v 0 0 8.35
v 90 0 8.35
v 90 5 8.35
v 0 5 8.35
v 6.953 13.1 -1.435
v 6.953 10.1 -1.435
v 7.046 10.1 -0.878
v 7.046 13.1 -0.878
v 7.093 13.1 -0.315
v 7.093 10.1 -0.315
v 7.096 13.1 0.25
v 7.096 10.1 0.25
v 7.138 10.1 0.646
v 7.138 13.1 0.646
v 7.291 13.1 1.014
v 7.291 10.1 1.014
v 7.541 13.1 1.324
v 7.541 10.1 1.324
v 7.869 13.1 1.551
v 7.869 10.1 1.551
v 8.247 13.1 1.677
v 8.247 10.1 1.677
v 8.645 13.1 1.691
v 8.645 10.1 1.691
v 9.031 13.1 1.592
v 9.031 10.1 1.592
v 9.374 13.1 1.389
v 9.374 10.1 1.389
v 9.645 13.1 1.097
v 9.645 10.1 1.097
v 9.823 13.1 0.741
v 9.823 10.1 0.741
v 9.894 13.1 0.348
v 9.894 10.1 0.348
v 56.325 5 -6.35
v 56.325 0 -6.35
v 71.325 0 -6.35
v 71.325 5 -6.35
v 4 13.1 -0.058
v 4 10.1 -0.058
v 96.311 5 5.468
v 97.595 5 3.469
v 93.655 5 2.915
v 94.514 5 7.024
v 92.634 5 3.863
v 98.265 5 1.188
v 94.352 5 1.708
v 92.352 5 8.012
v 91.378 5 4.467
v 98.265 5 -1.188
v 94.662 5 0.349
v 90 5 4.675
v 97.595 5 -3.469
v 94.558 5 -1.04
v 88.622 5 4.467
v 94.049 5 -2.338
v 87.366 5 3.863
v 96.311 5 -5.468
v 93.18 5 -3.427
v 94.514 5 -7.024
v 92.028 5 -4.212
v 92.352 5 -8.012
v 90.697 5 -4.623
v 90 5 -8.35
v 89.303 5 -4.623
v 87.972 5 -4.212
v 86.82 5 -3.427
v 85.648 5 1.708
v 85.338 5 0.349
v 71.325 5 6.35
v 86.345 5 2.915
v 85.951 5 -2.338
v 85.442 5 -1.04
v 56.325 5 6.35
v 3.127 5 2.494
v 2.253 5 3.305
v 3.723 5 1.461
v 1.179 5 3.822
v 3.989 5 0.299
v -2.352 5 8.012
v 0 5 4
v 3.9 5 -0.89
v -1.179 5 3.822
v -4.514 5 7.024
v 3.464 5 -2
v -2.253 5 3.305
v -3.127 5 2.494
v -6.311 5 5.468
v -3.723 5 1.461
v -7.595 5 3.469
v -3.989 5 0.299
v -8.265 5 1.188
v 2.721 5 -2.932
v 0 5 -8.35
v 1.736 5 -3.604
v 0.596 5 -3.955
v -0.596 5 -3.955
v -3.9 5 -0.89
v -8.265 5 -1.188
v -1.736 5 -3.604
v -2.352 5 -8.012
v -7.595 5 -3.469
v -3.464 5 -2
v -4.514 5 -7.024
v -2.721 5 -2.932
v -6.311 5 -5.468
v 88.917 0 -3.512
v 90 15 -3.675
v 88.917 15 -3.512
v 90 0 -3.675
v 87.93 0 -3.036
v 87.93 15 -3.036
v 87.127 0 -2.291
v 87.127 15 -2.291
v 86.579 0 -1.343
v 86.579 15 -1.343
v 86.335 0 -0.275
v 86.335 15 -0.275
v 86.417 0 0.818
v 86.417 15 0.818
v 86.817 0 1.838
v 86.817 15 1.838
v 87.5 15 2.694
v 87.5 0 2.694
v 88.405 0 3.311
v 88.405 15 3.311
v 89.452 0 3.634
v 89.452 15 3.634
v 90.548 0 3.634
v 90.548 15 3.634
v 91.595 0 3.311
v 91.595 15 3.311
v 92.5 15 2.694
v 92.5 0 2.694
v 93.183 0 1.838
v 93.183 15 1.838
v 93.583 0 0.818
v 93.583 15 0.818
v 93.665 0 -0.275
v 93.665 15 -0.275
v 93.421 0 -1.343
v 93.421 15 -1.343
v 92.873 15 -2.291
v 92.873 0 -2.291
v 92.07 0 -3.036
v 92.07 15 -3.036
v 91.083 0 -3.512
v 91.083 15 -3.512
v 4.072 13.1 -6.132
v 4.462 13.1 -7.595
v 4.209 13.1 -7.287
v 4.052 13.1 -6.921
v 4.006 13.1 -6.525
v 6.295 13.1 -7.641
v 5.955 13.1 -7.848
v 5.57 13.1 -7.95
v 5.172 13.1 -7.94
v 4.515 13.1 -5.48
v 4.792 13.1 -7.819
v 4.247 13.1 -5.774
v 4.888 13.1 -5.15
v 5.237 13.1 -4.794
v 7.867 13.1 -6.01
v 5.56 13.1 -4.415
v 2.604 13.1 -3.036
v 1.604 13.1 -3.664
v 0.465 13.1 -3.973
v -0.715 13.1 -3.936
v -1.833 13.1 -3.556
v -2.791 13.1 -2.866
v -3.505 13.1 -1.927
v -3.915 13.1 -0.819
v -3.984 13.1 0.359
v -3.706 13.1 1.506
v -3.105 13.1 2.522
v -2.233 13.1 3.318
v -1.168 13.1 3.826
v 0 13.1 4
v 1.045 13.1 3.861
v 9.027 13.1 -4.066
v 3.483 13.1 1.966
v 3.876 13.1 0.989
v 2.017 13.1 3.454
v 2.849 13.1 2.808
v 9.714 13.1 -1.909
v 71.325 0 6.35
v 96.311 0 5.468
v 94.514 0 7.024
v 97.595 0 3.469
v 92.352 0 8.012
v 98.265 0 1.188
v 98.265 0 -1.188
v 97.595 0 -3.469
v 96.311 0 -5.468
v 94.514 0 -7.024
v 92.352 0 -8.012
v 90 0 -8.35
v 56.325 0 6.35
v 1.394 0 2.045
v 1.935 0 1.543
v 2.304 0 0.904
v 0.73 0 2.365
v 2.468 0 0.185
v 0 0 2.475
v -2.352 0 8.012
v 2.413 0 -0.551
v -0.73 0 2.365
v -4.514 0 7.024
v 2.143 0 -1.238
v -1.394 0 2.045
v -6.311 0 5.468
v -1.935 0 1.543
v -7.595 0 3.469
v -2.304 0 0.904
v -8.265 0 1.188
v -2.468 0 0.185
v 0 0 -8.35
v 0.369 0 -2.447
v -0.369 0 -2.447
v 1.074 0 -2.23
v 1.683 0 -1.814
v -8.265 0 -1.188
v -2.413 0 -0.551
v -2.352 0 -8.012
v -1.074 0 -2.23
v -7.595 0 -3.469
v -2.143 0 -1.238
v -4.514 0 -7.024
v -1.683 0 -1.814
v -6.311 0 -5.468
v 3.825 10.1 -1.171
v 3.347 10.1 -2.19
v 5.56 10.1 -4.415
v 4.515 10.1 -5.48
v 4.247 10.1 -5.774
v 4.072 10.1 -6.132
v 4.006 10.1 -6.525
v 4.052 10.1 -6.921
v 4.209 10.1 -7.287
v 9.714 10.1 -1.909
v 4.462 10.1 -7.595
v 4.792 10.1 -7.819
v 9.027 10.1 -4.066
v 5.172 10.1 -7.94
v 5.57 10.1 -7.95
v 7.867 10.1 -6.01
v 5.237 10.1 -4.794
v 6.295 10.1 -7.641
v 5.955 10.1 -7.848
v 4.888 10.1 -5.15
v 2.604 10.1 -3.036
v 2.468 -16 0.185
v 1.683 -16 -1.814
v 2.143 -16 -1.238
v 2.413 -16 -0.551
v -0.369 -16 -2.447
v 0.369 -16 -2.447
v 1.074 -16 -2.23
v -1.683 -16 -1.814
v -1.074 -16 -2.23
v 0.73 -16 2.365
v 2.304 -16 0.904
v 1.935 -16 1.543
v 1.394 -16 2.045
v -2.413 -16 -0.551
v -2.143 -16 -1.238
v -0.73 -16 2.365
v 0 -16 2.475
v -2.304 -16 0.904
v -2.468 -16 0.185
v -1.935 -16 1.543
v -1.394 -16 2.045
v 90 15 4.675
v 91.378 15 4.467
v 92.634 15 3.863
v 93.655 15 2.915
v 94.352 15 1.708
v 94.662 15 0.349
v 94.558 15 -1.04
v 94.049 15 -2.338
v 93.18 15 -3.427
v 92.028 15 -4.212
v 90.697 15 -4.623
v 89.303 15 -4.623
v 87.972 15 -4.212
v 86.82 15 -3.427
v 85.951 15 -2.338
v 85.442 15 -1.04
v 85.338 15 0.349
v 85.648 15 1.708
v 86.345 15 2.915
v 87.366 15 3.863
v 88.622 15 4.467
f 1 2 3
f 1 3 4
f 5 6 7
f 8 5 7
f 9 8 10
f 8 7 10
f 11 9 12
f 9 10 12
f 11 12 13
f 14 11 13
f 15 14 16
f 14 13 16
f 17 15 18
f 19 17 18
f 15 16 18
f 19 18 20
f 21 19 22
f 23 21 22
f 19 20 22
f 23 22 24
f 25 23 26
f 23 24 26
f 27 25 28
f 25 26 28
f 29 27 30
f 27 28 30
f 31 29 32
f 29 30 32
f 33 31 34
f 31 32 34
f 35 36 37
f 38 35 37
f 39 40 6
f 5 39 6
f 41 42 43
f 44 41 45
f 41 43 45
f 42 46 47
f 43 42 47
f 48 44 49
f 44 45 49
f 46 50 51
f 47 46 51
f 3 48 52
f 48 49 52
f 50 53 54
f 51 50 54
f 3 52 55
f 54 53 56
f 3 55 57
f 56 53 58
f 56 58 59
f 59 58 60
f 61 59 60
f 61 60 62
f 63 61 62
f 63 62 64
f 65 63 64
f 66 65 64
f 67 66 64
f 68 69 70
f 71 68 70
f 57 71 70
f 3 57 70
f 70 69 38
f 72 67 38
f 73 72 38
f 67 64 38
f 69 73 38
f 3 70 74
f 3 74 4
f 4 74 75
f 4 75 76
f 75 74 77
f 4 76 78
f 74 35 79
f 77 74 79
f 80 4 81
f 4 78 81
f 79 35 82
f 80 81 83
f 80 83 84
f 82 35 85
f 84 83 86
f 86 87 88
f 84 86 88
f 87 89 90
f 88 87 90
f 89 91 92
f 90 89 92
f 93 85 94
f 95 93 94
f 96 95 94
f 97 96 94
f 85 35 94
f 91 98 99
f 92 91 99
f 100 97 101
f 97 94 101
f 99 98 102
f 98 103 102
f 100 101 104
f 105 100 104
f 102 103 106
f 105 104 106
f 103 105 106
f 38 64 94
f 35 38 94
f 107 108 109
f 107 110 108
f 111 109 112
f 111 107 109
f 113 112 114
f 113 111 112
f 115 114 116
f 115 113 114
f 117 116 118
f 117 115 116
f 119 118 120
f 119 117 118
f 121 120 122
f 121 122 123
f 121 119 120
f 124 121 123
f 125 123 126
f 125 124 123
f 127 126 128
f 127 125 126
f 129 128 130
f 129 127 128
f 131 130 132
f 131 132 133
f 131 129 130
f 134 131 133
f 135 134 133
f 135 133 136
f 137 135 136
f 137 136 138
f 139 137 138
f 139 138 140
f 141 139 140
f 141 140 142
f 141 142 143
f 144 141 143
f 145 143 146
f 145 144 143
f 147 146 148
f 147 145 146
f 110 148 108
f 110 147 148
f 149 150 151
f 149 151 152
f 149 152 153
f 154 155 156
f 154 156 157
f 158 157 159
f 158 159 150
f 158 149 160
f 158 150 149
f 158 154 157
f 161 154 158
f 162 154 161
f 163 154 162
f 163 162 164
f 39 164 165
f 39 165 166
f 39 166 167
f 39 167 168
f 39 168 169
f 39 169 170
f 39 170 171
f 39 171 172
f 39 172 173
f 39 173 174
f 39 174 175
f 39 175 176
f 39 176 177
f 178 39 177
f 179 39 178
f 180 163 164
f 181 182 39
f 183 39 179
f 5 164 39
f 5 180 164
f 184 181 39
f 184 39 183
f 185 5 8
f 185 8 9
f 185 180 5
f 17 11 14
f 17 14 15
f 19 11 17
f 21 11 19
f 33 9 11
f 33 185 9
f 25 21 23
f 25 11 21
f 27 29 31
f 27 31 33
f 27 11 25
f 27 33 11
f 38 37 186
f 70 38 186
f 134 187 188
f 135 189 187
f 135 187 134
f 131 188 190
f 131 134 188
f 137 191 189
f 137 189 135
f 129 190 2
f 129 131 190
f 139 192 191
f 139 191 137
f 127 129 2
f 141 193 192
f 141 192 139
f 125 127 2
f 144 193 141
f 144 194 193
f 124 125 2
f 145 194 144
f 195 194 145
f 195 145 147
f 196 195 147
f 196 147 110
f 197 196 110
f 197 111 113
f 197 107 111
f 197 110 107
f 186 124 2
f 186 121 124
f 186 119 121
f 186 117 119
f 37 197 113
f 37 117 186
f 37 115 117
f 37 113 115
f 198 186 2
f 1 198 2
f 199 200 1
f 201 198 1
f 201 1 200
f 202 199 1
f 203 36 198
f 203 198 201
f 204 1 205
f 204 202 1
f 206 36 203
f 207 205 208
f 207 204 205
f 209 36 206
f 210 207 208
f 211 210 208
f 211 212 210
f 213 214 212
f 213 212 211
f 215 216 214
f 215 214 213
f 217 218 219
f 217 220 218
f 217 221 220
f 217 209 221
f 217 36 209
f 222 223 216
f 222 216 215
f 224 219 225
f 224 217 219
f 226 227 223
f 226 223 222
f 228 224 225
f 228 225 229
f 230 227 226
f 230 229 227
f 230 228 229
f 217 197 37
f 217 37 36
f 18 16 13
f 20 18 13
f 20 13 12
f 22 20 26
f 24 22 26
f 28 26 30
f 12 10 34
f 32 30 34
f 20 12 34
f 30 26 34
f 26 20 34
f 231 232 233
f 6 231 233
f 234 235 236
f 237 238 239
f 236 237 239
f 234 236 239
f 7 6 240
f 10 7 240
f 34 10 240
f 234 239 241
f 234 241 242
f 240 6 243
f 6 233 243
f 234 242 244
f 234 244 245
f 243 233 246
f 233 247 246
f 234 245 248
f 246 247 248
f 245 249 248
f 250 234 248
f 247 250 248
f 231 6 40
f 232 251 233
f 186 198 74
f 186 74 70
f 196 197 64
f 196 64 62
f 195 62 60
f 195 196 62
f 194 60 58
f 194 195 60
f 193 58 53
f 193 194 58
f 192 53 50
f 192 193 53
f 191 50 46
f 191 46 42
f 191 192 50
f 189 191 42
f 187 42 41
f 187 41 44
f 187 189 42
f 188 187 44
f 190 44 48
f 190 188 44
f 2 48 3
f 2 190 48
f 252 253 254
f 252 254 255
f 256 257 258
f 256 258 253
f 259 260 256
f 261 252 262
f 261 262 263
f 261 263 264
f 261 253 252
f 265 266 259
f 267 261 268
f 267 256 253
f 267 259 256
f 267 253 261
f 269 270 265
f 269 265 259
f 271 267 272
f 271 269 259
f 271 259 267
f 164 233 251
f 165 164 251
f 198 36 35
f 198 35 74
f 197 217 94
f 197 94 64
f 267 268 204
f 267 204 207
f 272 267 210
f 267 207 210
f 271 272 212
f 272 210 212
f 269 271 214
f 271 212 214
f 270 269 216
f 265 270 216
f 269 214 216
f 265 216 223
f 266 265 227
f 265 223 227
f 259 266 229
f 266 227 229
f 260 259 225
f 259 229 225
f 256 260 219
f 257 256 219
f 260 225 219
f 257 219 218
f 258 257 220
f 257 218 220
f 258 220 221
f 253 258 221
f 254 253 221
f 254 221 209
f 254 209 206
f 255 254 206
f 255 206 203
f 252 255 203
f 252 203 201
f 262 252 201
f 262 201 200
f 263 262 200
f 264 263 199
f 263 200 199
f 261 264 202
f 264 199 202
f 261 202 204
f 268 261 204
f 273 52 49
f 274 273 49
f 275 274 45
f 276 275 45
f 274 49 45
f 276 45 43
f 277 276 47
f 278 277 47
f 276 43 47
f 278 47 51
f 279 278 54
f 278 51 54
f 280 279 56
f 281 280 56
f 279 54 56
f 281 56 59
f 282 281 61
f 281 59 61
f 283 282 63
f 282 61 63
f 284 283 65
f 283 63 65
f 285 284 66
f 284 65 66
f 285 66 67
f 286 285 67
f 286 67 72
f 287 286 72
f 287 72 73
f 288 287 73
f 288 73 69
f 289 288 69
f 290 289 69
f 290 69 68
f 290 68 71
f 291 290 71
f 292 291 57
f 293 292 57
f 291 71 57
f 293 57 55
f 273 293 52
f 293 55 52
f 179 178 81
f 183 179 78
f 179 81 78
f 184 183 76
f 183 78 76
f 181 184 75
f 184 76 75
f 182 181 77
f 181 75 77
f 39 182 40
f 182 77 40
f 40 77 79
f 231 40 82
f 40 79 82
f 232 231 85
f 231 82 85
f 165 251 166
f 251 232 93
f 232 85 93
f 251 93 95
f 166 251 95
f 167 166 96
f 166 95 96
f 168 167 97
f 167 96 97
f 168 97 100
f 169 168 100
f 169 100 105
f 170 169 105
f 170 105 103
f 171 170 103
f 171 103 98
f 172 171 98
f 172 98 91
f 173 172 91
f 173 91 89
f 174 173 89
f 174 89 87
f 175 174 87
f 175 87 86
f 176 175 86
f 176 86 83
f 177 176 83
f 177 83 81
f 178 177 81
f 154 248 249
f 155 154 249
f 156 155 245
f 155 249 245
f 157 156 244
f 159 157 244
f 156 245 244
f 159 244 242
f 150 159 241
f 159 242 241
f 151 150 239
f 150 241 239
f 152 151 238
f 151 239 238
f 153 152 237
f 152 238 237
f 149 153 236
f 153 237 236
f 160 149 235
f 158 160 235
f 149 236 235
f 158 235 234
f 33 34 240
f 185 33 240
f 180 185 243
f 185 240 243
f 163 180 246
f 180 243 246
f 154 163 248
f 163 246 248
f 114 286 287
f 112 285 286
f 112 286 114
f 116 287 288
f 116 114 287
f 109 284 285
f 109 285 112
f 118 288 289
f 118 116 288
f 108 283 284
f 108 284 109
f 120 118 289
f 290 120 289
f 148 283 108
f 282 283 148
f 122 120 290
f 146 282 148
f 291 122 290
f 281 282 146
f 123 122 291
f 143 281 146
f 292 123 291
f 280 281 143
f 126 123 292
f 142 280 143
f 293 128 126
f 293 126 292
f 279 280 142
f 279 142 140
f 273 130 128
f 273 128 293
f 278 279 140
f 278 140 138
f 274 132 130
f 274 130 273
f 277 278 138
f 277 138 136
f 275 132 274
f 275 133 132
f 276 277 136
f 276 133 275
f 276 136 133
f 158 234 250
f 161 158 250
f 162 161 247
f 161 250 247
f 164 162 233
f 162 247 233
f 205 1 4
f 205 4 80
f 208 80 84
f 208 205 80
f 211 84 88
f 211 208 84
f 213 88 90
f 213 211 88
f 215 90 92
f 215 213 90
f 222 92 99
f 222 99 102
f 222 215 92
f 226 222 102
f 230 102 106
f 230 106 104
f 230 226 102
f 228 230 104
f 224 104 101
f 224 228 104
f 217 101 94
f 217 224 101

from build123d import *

# Parameters (mm, degrees)
CORPS_DEPTH             = 5
ESQUISSE1_R             = 2.475
PULLEY_HOLD_DEPTH       = 16
ESQUISSE2_R             = 4
KNOB_HOLD_DEPTH         = 8.1
KNOB_START              = 5.1
KNOB_DEPTH              = 3
ESQUISSE3_R             = 3.675
ESQUISSE3_W             = 15
ESQUISSE3_H             = 12.7
ENL_V_MAT_EXTRU_1_DEPTH = 100.992224698
ESQUISSE5_R             = 4.675
ESQUISSE5_R_2           = 3.675
BOSS_EXTRU_1_DEPTH      = 10


with BuildPart() as part:
    # Sketch1 → corps (new body)
    with BuildSketch(Plane(origin=(0, 0, 0), x_dir=(1, 0, 0), z_dir=(0, 1, 0))):
        with BuildLine():
            Line((0, 8.35), (90, 8.35))
            ThreePointArc((90, 8.35), (98.35, 0), (90, -8.35))
            Line((90, -8.35), (0, -8.35))
            ThreePointArc((0, -8.35), (-8.35, 0), (0, 8.35))
        make_face()
    extrude(amount=CORPS_DEPTH)

    # Esquisse1 → pulley hold (add)
    with BuildSketch(Plane.XZ):
        with Locations(Location((0, 0, 0), (0, 0, 90))):
            Circle(ESQUISSE1_R)
    extrude(amount=PULLEY_HOLD_DEPTH)

    # Esquisse2 → knob hold (add)
    with BuildSketch(Plane(origin=(0, 5, 0), x_dir=(1, 0, 0), z_dir=(0, 1, 0))):
        with Locations(Location((0, 0, 0), (0, 0, 270))):
            Circle(ESQUISSE2_R)
    extrude(amount=KNOB_HOLD_DEPTH)

    # Esquisse4 → knob (add)
    with BuildSketch(Plane(origin=(0, 5, 0), x_dir=(1, 0, 0), z_dir=(0, 1, 0)).offset(KNOB_START)):
        with BuildLine():
            Line((3.999579917, 0.057969697), (6.953398299, 1.435357829))
            ThreePointArc((6.953398299, 1.435357829), (7.074856515, 0.596996899), (7.095602071, -0.249862457))
            ThreePointArc((7.095602071, -0.249862457), (8.44546622, -1.698263913), (9.893867677, -0.348399764))
            ThreePointArc((9.893867677, -0.348399764), (9.026569148, 4.065839324), (6.295408565, 7.640538659))
            ThreePointArc((6.295408565, 7.640538659), (4.324668554, 7.450318241), (4.514888971, 5.47957823))
            ThreePointArc((4.514888971, 5.47957823), (5.06564099, 4.974864959), (5.560313894, 4.415077508))
            Line((5.560313894, 4.415077508), (2.603837765, 3.036450048))
            ThreePointArc((2.603837765, 3.036450048), (3.622032243, 1.697316243), (3.999579917, 0.057969697))
        make_face()
    extrude(amount=KNOB_DEPTH)

    # Esquisse3 → Enlèv. mat.-Extru.1 (cut, through all)
    with BuildSketch(Plane.XZ):
        with Locations(Location((90, 0, 0), (0, 0, 270))):
            Circle(ESQUISSE3_R)
        with Locations((63.825, 0)):
            Rectangle(ESQUISSE3_W, ESQUISSE3_H)
    extrude(amount=-ENL_V_MAT_EXTRU_1_DEPTH, mode=Mode.SUBTRACT)

    # Esquisse5 → Boss.-Extru.1 (add)
    with BuildSketch(Plane(origin=(0, 5, 0), x_dir=(1, 0, 0), z_dir=(0, 1, 0))):
        with Locations(Location((90, 0, 0), (0, 0, 270))):
            Circle(ESQUISSE5_R)
        with Locations(Location((90, 0, 0), (0, 0, 90))):
            Circle(ESQUISSE5_R_2, mode=Mode.SUBTRACT)
    extrude(amount=BOSS_EXTRU_1_DEPTH)


solid = part.part
